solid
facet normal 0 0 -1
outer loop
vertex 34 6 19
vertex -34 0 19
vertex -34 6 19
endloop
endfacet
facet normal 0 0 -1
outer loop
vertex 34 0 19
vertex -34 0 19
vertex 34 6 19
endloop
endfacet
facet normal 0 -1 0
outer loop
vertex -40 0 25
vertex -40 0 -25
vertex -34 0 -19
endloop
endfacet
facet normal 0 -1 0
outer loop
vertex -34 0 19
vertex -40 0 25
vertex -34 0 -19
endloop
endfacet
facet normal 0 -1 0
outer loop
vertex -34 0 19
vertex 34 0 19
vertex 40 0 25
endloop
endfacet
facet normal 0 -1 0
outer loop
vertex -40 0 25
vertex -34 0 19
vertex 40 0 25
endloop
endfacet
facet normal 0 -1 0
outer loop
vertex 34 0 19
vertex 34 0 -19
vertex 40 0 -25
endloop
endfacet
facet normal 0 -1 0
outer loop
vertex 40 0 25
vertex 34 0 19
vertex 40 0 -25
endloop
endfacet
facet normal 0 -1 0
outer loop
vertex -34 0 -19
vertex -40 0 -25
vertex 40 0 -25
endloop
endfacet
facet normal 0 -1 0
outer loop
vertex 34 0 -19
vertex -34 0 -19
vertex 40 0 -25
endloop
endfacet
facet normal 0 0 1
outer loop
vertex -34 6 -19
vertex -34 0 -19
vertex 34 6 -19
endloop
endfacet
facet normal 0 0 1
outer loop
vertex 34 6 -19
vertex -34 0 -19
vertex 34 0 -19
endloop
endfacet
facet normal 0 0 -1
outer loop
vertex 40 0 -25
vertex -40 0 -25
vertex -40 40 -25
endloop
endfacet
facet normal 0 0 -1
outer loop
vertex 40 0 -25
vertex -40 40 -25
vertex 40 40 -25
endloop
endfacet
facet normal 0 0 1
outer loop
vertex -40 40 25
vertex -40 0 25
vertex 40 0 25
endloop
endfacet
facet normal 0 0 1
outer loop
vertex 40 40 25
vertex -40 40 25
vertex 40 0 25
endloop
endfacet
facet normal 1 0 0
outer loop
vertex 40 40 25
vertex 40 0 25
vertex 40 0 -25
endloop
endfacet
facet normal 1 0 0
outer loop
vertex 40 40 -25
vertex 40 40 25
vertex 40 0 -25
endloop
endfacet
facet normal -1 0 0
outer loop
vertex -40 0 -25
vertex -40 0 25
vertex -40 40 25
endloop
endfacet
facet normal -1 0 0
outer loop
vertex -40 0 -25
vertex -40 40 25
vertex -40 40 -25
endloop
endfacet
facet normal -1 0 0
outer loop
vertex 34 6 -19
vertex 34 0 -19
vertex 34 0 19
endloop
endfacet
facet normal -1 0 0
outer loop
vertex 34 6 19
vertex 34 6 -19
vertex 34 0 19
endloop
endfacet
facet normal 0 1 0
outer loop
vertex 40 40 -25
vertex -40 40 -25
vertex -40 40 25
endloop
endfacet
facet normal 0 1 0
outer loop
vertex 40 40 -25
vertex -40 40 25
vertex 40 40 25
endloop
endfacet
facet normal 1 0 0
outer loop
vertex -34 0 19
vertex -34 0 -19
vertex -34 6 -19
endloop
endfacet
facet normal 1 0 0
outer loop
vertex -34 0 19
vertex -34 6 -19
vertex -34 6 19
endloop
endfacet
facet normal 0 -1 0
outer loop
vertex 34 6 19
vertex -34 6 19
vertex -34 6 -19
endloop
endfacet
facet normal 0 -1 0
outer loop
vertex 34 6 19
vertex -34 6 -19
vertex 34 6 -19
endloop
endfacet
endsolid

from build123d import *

# Parameters (mm, degrees)
SKETCH2_W           = 80
SKETCH2_H           = 50
BOSS_EXTRUDE1_DEPTH = 40
SKETCH3_W           = 68
SKETCH3_H           = 38
CUT_EXTRUDE1_DEPTH  = 6


with BuildPart() as part:
    # Sketch2 → Boss-Extrude1 (new body)
    with BuildSketch(Plane(origin=(0, 0, 0), x_dir=(1, 0, 0), z_dir=(0, 1, 0))):
        Rectangle(SKETCH2_W, SKETCH2_H)
    extrude(amount=BOSS_EXTRUDE1_DEPTH)

    # Sketch3 → Cut-Extrude1 (cut)
    with BuildSketch(Plane.XZ):
        Rectangle(SKETCH3_W, SKETCH3_H)
    extrude(amount=-CUT_EXTRUDE1_DEPTH, mode=Mode.SUBTRACT)


solid = part.part
